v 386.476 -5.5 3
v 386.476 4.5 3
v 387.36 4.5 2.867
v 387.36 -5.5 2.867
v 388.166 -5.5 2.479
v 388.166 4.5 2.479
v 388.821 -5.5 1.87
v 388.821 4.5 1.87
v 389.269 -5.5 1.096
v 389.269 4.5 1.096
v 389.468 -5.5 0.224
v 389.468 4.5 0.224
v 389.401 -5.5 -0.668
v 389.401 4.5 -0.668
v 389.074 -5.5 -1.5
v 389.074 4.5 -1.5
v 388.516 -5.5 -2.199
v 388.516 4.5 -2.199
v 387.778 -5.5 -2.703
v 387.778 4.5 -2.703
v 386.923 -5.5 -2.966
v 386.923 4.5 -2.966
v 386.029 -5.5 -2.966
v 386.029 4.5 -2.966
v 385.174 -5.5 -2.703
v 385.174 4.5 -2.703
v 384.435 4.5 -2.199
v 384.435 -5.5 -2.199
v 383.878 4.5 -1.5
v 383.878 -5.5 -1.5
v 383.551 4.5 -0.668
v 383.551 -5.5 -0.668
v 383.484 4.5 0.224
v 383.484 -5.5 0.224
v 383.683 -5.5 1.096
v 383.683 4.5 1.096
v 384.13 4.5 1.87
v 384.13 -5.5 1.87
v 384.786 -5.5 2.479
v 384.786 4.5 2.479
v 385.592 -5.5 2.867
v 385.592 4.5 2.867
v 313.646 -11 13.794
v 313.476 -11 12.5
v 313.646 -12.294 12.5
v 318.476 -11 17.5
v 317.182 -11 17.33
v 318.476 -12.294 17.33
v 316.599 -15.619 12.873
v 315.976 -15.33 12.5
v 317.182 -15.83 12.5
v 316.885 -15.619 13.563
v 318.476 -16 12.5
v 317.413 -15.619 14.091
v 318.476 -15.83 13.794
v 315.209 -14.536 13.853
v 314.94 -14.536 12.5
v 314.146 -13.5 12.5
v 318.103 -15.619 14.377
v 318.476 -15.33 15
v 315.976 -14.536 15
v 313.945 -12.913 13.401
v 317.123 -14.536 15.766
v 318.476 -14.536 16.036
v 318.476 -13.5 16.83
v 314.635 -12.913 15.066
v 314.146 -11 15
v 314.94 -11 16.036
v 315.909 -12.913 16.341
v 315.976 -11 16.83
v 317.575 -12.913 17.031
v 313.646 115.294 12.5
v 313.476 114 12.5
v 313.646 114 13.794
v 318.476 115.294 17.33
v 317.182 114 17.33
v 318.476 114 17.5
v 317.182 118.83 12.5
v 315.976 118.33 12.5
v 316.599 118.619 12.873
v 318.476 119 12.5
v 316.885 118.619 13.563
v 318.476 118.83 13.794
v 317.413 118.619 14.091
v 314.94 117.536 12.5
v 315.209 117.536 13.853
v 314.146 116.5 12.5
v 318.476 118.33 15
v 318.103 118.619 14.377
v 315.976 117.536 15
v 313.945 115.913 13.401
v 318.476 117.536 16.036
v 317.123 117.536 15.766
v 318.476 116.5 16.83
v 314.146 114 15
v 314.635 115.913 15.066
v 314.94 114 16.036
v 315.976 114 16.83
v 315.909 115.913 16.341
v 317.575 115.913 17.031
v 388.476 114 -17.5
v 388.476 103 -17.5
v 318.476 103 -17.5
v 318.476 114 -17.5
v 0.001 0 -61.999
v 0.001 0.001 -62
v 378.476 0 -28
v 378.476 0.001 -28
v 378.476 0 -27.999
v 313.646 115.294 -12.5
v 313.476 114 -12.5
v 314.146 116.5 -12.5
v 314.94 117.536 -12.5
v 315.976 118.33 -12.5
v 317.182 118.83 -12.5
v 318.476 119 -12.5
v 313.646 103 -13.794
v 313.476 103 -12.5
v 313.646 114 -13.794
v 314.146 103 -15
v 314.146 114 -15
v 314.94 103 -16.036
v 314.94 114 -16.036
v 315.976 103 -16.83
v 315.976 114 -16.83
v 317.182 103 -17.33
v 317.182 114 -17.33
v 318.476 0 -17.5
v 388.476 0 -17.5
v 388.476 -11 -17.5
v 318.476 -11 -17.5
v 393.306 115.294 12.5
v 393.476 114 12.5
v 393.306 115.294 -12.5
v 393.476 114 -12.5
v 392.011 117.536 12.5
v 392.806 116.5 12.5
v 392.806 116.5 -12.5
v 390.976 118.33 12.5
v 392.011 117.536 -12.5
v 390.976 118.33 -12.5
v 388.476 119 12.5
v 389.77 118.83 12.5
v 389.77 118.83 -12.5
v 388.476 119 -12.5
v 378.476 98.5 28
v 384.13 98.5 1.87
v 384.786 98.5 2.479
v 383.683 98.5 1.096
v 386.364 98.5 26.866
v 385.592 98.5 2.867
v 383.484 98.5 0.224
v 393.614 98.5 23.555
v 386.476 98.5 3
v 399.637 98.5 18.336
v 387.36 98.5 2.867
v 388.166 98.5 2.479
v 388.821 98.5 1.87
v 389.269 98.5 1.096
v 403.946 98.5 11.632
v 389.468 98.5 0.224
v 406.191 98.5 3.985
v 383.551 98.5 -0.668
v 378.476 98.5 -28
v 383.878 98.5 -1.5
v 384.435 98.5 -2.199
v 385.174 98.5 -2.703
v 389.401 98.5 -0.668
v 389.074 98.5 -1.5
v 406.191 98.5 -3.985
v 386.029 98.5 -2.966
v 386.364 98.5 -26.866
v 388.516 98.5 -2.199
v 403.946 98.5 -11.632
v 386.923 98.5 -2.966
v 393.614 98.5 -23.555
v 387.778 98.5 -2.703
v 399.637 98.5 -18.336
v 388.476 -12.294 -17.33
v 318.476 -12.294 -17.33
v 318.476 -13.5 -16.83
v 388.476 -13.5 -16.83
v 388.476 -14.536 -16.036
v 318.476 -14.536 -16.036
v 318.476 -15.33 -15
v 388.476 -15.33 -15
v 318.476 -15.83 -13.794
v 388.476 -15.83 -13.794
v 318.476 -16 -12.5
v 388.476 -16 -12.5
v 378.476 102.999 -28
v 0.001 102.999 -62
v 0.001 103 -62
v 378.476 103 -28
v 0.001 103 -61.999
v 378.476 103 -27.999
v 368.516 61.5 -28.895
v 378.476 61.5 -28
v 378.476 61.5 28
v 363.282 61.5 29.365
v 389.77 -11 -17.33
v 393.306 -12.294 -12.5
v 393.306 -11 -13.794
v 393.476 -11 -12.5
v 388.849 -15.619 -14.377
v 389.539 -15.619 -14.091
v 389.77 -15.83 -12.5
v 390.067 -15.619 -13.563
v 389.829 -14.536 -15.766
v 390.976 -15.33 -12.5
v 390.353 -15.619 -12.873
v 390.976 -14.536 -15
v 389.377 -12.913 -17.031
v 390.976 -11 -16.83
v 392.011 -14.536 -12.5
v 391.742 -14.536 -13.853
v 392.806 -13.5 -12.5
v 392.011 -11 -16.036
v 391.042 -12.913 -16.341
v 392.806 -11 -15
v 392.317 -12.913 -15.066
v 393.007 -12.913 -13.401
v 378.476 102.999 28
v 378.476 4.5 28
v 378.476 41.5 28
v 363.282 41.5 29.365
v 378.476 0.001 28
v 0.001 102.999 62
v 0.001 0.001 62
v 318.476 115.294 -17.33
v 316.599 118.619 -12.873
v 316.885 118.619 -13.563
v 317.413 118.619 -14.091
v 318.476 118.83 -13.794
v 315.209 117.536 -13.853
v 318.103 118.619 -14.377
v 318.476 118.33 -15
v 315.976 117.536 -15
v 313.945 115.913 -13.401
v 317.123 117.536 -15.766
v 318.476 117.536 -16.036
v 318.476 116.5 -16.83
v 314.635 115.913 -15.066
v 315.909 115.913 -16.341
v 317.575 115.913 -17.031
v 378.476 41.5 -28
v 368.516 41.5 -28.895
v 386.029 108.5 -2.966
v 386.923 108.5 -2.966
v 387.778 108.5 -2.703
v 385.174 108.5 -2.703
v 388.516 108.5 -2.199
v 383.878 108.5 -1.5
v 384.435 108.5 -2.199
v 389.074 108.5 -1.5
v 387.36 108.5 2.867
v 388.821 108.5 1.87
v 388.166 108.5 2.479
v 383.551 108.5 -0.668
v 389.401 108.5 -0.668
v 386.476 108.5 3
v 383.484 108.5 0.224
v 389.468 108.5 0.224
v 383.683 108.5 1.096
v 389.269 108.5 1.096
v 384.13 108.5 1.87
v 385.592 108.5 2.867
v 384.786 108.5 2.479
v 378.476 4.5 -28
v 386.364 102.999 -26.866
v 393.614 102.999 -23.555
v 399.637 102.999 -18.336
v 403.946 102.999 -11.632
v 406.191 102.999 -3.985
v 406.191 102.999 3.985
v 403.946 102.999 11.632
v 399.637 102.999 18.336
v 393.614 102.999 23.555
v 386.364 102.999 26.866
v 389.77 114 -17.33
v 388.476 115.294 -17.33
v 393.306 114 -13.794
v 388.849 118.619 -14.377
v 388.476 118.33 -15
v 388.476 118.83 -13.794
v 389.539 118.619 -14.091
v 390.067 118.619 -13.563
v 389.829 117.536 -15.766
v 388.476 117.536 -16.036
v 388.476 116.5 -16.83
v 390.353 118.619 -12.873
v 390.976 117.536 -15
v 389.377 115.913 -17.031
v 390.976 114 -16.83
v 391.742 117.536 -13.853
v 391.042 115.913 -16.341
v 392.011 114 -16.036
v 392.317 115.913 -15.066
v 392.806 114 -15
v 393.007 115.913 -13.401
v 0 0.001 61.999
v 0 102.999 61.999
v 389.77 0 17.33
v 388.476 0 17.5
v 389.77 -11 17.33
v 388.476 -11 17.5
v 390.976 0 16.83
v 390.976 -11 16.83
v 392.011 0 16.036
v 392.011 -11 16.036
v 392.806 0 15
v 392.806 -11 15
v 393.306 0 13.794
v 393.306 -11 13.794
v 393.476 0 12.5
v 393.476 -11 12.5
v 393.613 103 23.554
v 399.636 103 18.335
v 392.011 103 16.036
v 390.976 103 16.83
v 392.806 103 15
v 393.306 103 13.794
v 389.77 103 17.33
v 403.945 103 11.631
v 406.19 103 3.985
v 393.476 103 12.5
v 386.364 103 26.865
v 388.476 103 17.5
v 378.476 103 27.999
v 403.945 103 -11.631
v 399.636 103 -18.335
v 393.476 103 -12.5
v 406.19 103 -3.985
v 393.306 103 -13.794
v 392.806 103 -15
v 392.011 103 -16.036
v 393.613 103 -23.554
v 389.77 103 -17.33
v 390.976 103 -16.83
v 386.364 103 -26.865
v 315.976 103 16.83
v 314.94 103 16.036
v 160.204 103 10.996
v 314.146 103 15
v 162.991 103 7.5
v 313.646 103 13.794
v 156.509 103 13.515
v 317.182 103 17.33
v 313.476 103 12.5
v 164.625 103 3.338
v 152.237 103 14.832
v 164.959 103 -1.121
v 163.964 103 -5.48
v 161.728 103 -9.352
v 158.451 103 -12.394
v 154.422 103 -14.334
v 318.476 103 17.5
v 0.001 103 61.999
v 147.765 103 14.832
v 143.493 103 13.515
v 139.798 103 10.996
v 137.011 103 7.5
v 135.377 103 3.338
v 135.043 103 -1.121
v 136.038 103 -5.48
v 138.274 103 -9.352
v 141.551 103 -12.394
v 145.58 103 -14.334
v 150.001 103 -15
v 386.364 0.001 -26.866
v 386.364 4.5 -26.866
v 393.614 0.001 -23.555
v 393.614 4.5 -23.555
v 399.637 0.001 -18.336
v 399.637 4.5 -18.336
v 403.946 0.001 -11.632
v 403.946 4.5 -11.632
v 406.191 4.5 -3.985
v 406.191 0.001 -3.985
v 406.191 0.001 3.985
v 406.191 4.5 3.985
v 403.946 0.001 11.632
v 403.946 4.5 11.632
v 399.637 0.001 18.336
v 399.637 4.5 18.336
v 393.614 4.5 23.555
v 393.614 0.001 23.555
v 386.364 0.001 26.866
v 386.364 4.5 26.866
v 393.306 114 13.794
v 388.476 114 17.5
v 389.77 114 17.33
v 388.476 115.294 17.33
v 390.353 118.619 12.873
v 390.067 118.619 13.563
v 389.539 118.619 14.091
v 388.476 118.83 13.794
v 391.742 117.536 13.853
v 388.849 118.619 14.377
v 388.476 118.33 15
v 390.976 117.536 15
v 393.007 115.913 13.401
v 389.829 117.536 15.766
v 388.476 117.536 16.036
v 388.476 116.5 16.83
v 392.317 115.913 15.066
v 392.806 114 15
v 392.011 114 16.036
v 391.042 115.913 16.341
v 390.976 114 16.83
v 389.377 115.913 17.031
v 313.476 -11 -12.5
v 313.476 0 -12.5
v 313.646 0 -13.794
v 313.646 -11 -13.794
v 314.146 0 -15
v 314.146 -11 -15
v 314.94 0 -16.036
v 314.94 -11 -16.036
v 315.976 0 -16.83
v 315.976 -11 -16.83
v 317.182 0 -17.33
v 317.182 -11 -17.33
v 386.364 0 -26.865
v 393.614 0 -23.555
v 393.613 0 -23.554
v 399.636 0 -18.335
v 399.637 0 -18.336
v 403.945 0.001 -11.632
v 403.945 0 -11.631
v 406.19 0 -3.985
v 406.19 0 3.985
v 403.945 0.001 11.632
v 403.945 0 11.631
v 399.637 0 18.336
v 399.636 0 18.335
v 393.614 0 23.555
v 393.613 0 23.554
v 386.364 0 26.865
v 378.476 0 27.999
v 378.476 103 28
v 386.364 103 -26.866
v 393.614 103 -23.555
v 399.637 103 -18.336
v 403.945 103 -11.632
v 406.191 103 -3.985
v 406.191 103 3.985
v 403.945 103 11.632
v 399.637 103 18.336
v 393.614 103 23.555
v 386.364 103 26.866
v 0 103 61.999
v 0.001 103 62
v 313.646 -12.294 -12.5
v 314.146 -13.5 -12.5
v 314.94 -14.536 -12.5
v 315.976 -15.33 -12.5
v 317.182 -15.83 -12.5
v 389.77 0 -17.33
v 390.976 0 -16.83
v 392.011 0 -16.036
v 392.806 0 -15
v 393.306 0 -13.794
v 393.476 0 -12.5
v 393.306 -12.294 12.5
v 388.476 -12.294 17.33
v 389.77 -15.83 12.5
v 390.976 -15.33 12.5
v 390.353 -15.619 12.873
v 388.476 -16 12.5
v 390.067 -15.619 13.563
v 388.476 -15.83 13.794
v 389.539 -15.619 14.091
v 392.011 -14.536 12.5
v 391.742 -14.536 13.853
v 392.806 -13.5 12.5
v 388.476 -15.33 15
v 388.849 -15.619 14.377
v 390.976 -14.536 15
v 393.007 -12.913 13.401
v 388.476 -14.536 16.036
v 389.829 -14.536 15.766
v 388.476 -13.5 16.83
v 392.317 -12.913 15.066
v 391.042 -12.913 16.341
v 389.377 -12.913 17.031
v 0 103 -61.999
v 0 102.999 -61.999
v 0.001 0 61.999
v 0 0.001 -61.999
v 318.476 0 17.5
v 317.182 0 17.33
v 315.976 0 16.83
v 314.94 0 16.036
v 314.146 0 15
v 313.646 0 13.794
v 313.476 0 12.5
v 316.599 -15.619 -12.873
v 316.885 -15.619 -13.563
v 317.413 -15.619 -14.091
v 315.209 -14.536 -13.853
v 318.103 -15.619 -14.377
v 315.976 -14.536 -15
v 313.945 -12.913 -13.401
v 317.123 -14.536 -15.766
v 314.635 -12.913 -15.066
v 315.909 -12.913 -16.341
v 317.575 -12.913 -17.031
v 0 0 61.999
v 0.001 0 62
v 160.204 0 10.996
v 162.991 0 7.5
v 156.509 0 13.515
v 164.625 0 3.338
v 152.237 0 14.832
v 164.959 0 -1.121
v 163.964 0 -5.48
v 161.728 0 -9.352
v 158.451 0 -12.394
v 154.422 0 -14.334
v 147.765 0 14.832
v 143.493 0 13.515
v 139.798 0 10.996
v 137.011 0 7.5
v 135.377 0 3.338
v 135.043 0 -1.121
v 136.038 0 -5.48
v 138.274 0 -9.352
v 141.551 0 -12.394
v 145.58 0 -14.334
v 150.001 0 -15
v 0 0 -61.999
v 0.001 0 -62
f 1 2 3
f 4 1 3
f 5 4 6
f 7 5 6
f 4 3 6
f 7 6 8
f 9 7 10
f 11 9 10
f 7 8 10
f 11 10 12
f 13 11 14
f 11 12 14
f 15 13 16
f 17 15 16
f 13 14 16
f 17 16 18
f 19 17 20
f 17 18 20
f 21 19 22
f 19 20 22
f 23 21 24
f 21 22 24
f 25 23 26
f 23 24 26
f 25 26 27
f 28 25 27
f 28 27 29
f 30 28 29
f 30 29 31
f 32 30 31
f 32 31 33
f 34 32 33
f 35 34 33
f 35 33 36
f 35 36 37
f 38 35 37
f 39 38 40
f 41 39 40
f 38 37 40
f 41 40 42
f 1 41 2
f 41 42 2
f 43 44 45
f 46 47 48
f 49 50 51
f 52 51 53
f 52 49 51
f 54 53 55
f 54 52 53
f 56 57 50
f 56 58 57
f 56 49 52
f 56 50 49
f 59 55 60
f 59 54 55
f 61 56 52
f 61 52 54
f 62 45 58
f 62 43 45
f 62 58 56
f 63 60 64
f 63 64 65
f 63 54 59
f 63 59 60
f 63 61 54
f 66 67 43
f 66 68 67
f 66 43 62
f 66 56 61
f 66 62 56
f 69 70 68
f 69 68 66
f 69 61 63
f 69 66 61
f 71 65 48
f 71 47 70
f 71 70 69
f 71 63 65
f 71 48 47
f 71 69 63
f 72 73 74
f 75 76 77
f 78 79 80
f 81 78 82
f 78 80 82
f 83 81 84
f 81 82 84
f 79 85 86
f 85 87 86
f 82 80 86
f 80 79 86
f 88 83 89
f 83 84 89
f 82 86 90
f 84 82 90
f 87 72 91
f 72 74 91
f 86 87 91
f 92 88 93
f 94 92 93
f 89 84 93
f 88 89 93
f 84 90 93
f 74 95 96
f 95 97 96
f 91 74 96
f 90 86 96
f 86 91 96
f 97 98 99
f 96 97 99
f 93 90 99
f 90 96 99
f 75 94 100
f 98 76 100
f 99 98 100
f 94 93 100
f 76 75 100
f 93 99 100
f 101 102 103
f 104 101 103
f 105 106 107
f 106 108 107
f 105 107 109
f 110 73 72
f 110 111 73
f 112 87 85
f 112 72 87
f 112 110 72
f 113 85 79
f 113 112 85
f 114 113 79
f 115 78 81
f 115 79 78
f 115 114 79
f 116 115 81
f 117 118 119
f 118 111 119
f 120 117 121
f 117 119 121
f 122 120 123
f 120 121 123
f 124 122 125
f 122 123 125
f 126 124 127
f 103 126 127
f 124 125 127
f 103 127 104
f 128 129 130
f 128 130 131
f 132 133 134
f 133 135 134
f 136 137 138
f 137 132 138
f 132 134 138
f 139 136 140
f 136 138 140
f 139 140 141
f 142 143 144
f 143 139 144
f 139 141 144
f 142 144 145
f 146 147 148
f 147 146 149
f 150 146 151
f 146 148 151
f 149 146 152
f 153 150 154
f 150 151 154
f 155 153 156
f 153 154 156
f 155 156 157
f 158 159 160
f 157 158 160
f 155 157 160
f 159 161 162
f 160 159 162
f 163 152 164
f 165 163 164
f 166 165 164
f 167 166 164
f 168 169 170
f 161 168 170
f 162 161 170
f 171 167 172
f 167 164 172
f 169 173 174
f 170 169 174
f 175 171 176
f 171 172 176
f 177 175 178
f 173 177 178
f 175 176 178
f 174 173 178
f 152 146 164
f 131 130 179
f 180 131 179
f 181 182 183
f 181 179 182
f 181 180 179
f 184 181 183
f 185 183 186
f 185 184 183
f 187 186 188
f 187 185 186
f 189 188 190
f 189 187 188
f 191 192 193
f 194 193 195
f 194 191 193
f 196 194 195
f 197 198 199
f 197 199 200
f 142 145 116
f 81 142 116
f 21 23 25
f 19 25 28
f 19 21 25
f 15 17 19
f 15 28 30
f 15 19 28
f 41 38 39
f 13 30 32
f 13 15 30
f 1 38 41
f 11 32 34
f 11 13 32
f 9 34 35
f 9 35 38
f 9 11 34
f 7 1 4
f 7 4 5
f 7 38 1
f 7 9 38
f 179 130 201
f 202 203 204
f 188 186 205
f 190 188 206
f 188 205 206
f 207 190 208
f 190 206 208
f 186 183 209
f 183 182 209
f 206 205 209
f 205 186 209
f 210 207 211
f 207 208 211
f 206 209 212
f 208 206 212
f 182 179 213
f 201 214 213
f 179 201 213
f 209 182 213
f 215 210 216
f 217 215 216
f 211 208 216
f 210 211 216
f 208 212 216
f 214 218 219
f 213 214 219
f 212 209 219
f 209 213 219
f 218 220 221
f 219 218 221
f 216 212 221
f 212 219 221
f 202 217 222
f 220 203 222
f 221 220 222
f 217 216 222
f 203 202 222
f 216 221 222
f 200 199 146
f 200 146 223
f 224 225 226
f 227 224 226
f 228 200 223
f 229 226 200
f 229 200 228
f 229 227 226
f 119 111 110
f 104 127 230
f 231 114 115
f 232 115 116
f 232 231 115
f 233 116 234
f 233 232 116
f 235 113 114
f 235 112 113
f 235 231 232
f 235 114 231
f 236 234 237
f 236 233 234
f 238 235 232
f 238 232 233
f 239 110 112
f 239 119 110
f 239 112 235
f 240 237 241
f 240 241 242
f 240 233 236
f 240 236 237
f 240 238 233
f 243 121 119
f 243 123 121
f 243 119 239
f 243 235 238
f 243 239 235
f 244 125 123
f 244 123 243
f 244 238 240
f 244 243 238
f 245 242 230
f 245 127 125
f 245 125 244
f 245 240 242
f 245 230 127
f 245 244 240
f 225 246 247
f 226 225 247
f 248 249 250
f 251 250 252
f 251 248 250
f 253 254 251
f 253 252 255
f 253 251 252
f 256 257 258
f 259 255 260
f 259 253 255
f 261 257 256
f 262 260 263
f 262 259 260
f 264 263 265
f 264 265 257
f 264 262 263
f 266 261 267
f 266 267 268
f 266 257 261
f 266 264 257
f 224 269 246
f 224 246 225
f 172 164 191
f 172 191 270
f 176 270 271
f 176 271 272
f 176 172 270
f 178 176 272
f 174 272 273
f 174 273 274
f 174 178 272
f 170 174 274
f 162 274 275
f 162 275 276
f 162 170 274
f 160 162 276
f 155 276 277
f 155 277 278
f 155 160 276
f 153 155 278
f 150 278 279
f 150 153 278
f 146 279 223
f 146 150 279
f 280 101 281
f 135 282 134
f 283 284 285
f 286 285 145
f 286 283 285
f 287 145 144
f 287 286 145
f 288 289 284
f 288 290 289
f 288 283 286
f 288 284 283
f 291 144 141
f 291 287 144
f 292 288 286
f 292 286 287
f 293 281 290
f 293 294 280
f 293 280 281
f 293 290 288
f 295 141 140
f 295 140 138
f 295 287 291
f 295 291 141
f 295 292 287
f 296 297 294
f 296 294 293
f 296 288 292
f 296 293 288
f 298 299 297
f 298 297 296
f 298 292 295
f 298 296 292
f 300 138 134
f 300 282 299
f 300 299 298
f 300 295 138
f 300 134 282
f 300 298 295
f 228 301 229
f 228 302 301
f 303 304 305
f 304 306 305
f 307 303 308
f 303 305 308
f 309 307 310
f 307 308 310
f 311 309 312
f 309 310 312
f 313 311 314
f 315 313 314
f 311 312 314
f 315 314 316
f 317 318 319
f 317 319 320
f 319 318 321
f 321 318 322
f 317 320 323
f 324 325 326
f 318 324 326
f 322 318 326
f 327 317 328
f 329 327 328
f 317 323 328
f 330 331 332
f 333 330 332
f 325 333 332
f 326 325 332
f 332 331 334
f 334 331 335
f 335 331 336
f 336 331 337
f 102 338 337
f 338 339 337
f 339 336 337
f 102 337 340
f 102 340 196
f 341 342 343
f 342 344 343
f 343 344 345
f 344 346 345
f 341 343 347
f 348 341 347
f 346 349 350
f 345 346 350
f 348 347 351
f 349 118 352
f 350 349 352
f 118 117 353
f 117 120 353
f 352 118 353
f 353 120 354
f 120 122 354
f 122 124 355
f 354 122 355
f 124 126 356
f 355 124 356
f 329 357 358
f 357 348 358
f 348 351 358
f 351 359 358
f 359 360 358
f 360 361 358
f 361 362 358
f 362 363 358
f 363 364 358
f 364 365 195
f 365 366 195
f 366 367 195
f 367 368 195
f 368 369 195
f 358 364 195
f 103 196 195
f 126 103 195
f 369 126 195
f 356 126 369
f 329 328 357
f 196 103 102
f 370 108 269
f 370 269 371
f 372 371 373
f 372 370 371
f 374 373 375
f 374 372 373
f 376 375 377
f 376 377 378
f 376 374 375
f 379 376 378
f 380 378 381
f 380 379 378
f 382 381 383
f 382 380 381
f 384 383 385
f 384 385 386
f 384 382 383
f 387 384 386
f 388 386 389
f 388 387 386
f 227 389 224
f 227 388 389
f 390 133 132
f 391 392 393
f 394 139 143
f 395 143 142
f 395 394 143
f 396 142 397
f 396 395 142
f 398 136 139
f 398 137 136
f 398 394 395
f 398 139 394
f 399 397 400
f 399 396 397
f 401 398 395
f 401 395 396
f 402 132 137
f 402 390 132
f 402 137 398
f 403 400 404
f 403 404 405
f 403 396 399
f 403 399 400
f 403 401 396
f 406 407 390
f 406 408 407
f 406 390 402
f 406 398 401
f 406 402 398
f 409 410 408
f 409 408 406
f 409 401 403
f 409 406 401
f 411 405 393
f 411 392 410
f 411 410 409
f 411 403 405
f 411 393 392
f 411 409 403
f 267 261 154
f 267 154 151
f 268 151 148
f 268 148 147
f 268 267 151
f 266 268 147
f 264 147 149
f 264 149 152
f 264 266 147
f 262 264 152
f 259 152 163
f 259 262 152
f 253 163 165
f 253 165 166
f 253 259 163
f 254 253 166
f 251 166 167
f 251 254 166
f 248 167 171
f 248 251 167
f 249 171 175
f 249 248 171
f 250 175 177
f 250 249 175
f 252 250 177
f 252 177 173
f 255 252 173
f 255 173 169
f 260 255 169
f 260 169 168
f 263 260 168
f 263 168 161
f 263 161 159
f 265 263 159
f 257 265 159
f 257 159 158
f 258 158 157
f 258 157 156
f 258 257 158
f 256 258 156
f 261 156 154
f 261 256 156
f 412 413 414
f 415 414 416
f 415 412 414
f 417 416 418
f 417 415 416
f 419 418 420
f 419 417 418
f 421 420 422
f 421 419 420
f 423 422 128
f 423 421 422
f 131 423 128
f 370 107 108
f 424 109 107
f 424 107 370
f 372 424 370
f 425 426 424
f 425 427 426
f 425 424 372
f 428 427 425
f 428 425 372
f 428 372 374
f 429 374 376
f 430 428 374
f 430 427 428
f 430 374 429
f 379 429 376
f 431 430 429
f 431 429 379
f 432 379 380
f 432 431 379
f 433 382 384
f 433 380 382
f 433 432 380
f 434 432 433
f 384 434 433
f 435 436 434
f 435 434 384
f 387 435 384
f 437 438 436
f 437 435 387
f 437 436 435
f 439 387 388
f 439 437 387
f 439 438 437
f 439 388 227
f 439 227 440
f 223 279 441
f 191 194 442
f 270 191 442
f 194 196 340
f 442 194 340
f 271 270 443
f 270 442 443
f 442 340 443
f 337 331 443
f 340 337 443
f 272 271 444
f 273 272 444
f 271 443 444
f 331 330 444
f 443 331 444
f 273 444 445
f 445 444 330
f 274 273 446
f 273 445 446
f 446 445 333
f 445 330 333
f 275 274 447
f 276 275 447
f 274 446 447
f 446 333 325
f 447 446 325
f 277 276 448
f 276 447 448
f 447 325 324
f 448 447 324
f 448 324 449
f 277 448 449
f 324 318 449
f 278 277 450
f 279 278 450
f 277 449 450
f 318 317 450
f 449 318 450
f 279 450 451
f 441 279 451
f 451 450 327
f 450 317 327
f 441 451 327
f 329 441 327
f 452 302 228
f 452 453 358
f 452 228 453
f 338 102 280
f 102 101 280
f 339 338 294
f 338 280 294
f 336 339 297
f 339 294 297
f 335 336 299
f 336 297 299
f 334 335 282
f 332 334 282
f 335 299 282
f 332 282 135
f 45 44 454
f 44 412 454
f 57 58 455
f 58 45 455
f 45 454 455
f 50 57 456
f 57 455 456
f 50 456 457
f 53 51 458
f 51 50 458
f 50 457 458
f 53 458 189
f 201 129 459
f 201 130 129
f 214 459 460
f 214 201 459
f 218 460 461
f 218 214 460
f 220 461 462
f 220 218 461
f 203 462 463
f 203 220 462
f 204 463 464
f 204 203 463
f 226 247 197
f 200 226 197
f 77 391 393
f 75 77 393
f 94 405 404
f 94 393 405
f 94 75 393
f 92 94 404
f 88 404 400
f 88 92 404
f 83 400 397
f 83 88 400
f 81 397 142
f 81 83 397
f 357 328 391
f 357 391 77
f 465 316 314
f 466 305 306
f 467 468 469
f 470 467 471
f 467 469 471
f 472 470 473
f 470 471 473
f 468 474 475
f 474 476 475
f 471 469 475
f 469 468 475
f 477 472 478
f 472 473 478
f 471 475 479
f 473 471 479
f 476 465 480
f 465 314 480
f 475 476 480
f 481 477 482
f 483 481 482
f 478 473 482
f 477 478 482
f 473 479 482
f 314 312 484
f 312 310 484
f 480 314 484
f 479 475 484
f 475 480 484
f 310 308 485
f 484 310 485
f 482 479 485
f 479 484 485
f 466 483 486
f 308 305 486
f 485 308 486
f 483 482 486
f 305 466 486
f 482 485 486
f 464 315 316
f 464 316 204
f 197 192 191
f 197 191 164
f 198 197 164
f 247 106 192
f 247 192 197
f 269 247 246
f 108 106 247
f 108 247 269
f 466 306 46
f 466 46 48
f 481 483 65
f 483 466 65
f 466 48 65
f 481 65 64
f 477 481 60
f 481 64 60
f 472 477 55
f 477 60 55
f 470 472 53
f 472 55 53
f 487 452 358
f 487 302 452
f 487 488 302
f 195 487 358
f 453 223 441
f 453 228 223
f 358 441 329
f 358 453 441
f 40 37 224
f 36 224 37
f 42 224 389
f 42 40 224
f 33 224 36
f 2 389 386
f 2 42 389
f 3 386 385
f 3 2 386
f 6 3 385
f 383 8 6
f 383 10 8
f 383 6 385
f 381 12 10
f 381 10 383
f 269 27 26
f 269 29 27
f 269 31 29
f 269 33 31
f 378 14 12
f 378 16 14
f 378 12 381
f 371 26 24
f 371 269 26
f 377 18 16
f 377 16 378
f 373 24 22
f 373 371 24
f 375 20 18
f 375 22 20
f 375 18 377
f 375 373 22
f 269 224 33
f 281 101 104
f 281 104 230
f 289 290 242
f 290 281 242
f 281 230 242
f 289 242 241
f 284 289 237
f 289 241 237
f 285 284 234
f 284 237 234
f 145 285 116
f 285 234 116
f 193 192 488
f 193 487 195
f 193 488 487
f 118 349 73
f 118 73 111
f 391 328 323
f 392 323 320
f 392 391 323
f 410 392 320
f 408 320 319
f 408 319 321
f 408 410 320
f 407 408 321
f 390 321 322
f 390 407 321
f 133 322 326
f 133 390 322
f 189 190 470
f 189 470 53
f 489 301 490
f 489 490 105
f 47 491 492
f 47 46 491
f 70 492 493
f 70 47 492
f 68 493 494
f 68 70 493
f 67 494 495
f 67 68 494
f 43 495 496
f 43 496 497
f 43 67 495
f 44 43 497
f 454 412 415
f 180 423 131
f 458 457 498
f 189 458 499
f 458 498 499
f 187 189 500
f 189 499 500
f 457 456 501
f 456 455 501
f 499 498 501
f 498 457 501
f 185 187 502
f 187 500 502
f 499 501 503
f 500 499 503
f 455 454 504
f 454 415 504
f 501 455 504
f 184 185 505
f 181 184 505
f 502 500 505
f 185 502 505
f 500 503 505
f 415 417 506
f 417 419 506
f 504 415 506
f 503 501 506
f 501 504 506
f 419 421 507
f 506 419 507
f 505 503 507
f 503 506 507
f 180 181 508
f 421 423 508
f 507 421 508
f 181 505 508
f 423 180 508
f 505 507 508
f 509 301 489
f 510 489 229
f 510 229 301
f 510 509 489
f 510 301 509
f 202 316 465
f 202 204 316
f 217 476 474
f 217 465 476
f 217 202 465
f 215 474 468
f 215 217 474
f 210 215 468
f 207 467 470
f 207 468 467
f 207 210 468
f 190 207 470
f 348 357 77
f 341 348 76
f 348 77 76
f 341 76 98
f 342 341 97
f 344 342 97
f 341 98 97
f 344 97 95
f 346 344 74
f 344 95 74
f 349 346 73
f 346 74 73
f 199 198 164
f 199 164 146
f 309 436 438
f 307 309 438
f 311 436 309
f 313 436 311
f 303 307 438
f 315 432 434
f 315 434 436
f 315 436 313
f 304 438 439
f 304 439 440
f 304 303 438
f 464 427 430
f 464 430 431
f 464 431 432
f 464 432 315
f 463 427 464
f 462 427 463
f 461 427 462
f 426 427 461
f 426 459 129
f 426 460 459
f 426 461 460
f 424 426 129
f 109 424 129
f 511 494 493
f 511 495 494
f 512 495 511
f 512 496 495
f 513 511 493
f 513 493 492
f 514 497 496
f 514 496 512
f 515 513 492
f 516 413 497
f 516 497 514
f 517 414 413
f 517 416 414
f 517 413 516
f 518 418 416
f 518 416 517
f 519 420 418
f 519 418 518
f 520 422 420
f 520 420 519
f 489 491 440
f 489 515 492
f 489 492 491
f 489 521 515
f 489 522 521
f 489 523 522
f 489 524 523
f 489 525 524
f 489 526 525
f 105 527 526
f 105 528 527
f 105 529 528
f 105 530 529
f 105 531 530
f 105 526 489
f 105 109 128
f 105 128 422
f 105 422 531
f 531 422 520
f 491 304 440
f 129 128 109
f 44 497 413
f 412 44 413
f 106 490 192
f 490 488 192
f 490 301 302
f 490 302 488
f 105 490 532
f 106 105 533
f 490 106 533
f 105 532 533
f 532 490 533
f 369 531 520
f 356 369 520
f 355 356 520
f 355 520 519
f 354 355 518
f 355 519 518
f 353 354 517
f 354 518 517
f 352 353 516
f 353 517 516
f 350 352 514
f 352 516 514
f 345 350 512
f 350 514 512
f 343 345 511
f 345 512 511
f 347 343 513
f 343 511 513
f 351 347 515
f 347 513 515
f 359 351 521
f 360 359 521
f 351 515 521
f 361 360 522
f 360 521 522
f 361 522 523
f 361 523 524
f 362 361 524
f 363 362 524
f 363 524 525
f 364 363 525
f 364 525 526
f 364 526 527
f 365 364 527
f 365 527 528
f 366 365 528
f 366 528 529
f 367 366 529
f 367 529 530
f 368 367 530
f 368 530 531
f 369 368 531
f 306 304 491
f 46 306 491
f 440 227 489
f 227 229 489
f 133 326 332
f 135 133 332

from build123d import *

# Parameters (mm, degrees)
BOSS_EXTRUDE1_DEPTH  = 103
FILLET1_R            = 0.001
SKETCH3_W            = 80
SKETCH3_H            = 35
BOSS_EXTRUDE2_DEPTH  = 16
FILLET2_R            = 5
SKETCH4_R            = 15
CUT_EXTRUDE1_DEPTH   = 424.88163248
CUT_EXTRUDE10_DEPTH  = 47
SKETCH17_W           = 20
SKETCH17_H           = 20
CUT_EXTRUDE13_DEPTH  = 94
FILLET2_OF_MIRROR1_R = 5
SKETCH19_R           = 3
CUT_EXTRUDE14_DEPTH  = 10
CUT_EXTRUDE15_START  = -10
SKETCH20_R           = 3
CUT_EXTRUDE15_DEPTH  = 10


with BuildPart() as part:
    # Sketch1 → Boss-Extrude1 (new body)
    with BuildSketch(Plane(origin=(0, 0, 0), x_dir=(1, 0, 0), z_dir=(0, 1, 0))):
        with BuildLine():
            Line((0, -62), (0, 62))
            Line((0, 62), (378.47589091, 28))
            ThreePointArc((378.47589091, 28), (406.47589091, 0), (378.47589091, -28))
            Line((378.47589091, -28), (0, -62))
        make_face()
    extrude(amount=BOSS_EXTRUDE1_DEPTH)

    # Fillet1
    fillet1_edges = [part.edges().sort_by_distance(p)[0] for p in [
        (378.47589091, 51.5, 28),
        (406.47589091, 103, 0),
        (378.47589091, 51.5, -28),
        (406.47589091, 0, 0),
        (0, 51.5, -62),
        (0, 103, 0),
        (0, 51.5, 62),
        (0, 0, 0),
        (189.237945455, 0, 45),
        (189.237945455, 0, -45),
        (189.237945455, 103, 45),
        (189.237945455, 103, -45),
    ]]
    fillet(fillet1_edges, radius=FILLET1_R)

    # Sketch3 → Boss-Extrude2 (add)
    with BuildSketch(Plane(origin=(0, 0, 0), x_dir=(-1, 0, 0), z_dir=(0, -1, 0))):
        with Locations((-353.47589091, 0)):
            Rectangle(SKETCH3_W, SKETCH3_H)
    boss_extrude2 = extrude(amount=BOSS_EXTRUDE2_DEPTH)

    # Fillet2
    fillet2_edges = [part.edges().sort_by_distance(p)[0] for p in [
        (313.47589091, -8, 17.5),
        (313.47589091, -8, -17.5),
        (393.47589091, -8, -17.5),
        (393.47589091, -8, 17.5),
        (313.47589091, -16, 0),
        (353.47589091, -16, -17.5),
        (393.47589091, -16, 0),
        (353.47589091, -16, 17.5),
    ]]
    fillet(fillet2_edges, radius=FILLET2_R)

    # Sketch4 → Cut-Extrude1 (cut, through all)
    with BuildSketch(Plane.XZ):
        with Locations(Location((150.001, 0, 0), (0, 0, 270))):
            Circle(SKETCH4_R)
    extrude(amount=-CUT_EXTRUDE1_DEPTH, mode=Mode.SUBTRACT)

    # Sketch15 → Cut-Extrude10 (cut, symmetric)
    with BuildSketch(Plane(origin=(0, 51.5, 0), x_dir=(-1, 0, 0), z_dir=(0, -1, 0))):
        with BuildLine():
            Line((-378.47589091, 29), (-378.47589091, -29))
            ThreePointArc((-378.47589091, -29), (-407.47589091, 0), (-378.47589091, 29))
        make_face()
    extrude(amount=CUT_EXTRUDE10_DEPTH, both=True, mode=Mode.SUBTRACT)

    # Sketch17 → Cut-Extrude13 (cut)
    with BuildSketch(Plane(origin=(5.525118961, 0, -61.50365651), x_dir=(-0.9959891866048521, 0, -0.08947368421052682), z_dir=(0.08947368421052682, 0, -0.9959891866048521))):
        with Locations((-374.452586753, 51.5)):
            Rectangle(SKETCH17_W, SKETCH17_H)
    extrude(amount=-CUT_EXTRUDE13_DEPTH, mode=Mode.SUBTRACT)

    # Mirror1: Boss-Extrude2 across plane
    add(boss_extrude2.mirror(Plane(origin=(0, 51.5, 0), x_dir=(0, 0, 1), z_dir=(0, -1, 0))))

    # Fillet2 of Mirror1
    fillet2_of_mirror1_edges = [part.edges().sort_by_distance(p)[0] for p in [
        (313.47589091, 111, 17.5),
        (313.47589091, 111, -17.5),
        (393.47589091, 111, -17.5),
        (393.47589091, 111, 17.5),
        (313.47589091, 119, 0),
        (353.47589091, 119, -17.5),
        (393.47589091, 119, 0),
        (353.47589091, 119, 17.5),
    ]]
    fillet(fillet2_of_mirror1_edges, radius=FILLET2_OF_MIRROR1_R)

    # Sketch19 → Cut-Extrude14 (cut)
    with BuildSketch(Plane(origin=(0, 4.5, 0), x_dir=(1, 0, 0), z_dir=(0, 1, 0))):
        with Locations(Location((386.47589091, 0, 0), (0, 0, 270))):
            Circle(SKETCH19_R)
    extrude(amount=-CUT_EXTRUDE14_DEPTH, mode=Mode.SUBTRACT)

    # Sketch20 → Cut-Extrude15 (cut)
    with BuildSketch(Plane.XZ.offset(-98.5).offset(CUT_EXTRUDE15_START)):
        with Locations(Location((386.47589091, 0, 0), (0, 0, 90))):
            Circle(SKETCH20_R)
    extrude(amount=CUT_EXTRUDE15_DEPTH, mode=Mode.SUBTRACT)


solid = part.part
